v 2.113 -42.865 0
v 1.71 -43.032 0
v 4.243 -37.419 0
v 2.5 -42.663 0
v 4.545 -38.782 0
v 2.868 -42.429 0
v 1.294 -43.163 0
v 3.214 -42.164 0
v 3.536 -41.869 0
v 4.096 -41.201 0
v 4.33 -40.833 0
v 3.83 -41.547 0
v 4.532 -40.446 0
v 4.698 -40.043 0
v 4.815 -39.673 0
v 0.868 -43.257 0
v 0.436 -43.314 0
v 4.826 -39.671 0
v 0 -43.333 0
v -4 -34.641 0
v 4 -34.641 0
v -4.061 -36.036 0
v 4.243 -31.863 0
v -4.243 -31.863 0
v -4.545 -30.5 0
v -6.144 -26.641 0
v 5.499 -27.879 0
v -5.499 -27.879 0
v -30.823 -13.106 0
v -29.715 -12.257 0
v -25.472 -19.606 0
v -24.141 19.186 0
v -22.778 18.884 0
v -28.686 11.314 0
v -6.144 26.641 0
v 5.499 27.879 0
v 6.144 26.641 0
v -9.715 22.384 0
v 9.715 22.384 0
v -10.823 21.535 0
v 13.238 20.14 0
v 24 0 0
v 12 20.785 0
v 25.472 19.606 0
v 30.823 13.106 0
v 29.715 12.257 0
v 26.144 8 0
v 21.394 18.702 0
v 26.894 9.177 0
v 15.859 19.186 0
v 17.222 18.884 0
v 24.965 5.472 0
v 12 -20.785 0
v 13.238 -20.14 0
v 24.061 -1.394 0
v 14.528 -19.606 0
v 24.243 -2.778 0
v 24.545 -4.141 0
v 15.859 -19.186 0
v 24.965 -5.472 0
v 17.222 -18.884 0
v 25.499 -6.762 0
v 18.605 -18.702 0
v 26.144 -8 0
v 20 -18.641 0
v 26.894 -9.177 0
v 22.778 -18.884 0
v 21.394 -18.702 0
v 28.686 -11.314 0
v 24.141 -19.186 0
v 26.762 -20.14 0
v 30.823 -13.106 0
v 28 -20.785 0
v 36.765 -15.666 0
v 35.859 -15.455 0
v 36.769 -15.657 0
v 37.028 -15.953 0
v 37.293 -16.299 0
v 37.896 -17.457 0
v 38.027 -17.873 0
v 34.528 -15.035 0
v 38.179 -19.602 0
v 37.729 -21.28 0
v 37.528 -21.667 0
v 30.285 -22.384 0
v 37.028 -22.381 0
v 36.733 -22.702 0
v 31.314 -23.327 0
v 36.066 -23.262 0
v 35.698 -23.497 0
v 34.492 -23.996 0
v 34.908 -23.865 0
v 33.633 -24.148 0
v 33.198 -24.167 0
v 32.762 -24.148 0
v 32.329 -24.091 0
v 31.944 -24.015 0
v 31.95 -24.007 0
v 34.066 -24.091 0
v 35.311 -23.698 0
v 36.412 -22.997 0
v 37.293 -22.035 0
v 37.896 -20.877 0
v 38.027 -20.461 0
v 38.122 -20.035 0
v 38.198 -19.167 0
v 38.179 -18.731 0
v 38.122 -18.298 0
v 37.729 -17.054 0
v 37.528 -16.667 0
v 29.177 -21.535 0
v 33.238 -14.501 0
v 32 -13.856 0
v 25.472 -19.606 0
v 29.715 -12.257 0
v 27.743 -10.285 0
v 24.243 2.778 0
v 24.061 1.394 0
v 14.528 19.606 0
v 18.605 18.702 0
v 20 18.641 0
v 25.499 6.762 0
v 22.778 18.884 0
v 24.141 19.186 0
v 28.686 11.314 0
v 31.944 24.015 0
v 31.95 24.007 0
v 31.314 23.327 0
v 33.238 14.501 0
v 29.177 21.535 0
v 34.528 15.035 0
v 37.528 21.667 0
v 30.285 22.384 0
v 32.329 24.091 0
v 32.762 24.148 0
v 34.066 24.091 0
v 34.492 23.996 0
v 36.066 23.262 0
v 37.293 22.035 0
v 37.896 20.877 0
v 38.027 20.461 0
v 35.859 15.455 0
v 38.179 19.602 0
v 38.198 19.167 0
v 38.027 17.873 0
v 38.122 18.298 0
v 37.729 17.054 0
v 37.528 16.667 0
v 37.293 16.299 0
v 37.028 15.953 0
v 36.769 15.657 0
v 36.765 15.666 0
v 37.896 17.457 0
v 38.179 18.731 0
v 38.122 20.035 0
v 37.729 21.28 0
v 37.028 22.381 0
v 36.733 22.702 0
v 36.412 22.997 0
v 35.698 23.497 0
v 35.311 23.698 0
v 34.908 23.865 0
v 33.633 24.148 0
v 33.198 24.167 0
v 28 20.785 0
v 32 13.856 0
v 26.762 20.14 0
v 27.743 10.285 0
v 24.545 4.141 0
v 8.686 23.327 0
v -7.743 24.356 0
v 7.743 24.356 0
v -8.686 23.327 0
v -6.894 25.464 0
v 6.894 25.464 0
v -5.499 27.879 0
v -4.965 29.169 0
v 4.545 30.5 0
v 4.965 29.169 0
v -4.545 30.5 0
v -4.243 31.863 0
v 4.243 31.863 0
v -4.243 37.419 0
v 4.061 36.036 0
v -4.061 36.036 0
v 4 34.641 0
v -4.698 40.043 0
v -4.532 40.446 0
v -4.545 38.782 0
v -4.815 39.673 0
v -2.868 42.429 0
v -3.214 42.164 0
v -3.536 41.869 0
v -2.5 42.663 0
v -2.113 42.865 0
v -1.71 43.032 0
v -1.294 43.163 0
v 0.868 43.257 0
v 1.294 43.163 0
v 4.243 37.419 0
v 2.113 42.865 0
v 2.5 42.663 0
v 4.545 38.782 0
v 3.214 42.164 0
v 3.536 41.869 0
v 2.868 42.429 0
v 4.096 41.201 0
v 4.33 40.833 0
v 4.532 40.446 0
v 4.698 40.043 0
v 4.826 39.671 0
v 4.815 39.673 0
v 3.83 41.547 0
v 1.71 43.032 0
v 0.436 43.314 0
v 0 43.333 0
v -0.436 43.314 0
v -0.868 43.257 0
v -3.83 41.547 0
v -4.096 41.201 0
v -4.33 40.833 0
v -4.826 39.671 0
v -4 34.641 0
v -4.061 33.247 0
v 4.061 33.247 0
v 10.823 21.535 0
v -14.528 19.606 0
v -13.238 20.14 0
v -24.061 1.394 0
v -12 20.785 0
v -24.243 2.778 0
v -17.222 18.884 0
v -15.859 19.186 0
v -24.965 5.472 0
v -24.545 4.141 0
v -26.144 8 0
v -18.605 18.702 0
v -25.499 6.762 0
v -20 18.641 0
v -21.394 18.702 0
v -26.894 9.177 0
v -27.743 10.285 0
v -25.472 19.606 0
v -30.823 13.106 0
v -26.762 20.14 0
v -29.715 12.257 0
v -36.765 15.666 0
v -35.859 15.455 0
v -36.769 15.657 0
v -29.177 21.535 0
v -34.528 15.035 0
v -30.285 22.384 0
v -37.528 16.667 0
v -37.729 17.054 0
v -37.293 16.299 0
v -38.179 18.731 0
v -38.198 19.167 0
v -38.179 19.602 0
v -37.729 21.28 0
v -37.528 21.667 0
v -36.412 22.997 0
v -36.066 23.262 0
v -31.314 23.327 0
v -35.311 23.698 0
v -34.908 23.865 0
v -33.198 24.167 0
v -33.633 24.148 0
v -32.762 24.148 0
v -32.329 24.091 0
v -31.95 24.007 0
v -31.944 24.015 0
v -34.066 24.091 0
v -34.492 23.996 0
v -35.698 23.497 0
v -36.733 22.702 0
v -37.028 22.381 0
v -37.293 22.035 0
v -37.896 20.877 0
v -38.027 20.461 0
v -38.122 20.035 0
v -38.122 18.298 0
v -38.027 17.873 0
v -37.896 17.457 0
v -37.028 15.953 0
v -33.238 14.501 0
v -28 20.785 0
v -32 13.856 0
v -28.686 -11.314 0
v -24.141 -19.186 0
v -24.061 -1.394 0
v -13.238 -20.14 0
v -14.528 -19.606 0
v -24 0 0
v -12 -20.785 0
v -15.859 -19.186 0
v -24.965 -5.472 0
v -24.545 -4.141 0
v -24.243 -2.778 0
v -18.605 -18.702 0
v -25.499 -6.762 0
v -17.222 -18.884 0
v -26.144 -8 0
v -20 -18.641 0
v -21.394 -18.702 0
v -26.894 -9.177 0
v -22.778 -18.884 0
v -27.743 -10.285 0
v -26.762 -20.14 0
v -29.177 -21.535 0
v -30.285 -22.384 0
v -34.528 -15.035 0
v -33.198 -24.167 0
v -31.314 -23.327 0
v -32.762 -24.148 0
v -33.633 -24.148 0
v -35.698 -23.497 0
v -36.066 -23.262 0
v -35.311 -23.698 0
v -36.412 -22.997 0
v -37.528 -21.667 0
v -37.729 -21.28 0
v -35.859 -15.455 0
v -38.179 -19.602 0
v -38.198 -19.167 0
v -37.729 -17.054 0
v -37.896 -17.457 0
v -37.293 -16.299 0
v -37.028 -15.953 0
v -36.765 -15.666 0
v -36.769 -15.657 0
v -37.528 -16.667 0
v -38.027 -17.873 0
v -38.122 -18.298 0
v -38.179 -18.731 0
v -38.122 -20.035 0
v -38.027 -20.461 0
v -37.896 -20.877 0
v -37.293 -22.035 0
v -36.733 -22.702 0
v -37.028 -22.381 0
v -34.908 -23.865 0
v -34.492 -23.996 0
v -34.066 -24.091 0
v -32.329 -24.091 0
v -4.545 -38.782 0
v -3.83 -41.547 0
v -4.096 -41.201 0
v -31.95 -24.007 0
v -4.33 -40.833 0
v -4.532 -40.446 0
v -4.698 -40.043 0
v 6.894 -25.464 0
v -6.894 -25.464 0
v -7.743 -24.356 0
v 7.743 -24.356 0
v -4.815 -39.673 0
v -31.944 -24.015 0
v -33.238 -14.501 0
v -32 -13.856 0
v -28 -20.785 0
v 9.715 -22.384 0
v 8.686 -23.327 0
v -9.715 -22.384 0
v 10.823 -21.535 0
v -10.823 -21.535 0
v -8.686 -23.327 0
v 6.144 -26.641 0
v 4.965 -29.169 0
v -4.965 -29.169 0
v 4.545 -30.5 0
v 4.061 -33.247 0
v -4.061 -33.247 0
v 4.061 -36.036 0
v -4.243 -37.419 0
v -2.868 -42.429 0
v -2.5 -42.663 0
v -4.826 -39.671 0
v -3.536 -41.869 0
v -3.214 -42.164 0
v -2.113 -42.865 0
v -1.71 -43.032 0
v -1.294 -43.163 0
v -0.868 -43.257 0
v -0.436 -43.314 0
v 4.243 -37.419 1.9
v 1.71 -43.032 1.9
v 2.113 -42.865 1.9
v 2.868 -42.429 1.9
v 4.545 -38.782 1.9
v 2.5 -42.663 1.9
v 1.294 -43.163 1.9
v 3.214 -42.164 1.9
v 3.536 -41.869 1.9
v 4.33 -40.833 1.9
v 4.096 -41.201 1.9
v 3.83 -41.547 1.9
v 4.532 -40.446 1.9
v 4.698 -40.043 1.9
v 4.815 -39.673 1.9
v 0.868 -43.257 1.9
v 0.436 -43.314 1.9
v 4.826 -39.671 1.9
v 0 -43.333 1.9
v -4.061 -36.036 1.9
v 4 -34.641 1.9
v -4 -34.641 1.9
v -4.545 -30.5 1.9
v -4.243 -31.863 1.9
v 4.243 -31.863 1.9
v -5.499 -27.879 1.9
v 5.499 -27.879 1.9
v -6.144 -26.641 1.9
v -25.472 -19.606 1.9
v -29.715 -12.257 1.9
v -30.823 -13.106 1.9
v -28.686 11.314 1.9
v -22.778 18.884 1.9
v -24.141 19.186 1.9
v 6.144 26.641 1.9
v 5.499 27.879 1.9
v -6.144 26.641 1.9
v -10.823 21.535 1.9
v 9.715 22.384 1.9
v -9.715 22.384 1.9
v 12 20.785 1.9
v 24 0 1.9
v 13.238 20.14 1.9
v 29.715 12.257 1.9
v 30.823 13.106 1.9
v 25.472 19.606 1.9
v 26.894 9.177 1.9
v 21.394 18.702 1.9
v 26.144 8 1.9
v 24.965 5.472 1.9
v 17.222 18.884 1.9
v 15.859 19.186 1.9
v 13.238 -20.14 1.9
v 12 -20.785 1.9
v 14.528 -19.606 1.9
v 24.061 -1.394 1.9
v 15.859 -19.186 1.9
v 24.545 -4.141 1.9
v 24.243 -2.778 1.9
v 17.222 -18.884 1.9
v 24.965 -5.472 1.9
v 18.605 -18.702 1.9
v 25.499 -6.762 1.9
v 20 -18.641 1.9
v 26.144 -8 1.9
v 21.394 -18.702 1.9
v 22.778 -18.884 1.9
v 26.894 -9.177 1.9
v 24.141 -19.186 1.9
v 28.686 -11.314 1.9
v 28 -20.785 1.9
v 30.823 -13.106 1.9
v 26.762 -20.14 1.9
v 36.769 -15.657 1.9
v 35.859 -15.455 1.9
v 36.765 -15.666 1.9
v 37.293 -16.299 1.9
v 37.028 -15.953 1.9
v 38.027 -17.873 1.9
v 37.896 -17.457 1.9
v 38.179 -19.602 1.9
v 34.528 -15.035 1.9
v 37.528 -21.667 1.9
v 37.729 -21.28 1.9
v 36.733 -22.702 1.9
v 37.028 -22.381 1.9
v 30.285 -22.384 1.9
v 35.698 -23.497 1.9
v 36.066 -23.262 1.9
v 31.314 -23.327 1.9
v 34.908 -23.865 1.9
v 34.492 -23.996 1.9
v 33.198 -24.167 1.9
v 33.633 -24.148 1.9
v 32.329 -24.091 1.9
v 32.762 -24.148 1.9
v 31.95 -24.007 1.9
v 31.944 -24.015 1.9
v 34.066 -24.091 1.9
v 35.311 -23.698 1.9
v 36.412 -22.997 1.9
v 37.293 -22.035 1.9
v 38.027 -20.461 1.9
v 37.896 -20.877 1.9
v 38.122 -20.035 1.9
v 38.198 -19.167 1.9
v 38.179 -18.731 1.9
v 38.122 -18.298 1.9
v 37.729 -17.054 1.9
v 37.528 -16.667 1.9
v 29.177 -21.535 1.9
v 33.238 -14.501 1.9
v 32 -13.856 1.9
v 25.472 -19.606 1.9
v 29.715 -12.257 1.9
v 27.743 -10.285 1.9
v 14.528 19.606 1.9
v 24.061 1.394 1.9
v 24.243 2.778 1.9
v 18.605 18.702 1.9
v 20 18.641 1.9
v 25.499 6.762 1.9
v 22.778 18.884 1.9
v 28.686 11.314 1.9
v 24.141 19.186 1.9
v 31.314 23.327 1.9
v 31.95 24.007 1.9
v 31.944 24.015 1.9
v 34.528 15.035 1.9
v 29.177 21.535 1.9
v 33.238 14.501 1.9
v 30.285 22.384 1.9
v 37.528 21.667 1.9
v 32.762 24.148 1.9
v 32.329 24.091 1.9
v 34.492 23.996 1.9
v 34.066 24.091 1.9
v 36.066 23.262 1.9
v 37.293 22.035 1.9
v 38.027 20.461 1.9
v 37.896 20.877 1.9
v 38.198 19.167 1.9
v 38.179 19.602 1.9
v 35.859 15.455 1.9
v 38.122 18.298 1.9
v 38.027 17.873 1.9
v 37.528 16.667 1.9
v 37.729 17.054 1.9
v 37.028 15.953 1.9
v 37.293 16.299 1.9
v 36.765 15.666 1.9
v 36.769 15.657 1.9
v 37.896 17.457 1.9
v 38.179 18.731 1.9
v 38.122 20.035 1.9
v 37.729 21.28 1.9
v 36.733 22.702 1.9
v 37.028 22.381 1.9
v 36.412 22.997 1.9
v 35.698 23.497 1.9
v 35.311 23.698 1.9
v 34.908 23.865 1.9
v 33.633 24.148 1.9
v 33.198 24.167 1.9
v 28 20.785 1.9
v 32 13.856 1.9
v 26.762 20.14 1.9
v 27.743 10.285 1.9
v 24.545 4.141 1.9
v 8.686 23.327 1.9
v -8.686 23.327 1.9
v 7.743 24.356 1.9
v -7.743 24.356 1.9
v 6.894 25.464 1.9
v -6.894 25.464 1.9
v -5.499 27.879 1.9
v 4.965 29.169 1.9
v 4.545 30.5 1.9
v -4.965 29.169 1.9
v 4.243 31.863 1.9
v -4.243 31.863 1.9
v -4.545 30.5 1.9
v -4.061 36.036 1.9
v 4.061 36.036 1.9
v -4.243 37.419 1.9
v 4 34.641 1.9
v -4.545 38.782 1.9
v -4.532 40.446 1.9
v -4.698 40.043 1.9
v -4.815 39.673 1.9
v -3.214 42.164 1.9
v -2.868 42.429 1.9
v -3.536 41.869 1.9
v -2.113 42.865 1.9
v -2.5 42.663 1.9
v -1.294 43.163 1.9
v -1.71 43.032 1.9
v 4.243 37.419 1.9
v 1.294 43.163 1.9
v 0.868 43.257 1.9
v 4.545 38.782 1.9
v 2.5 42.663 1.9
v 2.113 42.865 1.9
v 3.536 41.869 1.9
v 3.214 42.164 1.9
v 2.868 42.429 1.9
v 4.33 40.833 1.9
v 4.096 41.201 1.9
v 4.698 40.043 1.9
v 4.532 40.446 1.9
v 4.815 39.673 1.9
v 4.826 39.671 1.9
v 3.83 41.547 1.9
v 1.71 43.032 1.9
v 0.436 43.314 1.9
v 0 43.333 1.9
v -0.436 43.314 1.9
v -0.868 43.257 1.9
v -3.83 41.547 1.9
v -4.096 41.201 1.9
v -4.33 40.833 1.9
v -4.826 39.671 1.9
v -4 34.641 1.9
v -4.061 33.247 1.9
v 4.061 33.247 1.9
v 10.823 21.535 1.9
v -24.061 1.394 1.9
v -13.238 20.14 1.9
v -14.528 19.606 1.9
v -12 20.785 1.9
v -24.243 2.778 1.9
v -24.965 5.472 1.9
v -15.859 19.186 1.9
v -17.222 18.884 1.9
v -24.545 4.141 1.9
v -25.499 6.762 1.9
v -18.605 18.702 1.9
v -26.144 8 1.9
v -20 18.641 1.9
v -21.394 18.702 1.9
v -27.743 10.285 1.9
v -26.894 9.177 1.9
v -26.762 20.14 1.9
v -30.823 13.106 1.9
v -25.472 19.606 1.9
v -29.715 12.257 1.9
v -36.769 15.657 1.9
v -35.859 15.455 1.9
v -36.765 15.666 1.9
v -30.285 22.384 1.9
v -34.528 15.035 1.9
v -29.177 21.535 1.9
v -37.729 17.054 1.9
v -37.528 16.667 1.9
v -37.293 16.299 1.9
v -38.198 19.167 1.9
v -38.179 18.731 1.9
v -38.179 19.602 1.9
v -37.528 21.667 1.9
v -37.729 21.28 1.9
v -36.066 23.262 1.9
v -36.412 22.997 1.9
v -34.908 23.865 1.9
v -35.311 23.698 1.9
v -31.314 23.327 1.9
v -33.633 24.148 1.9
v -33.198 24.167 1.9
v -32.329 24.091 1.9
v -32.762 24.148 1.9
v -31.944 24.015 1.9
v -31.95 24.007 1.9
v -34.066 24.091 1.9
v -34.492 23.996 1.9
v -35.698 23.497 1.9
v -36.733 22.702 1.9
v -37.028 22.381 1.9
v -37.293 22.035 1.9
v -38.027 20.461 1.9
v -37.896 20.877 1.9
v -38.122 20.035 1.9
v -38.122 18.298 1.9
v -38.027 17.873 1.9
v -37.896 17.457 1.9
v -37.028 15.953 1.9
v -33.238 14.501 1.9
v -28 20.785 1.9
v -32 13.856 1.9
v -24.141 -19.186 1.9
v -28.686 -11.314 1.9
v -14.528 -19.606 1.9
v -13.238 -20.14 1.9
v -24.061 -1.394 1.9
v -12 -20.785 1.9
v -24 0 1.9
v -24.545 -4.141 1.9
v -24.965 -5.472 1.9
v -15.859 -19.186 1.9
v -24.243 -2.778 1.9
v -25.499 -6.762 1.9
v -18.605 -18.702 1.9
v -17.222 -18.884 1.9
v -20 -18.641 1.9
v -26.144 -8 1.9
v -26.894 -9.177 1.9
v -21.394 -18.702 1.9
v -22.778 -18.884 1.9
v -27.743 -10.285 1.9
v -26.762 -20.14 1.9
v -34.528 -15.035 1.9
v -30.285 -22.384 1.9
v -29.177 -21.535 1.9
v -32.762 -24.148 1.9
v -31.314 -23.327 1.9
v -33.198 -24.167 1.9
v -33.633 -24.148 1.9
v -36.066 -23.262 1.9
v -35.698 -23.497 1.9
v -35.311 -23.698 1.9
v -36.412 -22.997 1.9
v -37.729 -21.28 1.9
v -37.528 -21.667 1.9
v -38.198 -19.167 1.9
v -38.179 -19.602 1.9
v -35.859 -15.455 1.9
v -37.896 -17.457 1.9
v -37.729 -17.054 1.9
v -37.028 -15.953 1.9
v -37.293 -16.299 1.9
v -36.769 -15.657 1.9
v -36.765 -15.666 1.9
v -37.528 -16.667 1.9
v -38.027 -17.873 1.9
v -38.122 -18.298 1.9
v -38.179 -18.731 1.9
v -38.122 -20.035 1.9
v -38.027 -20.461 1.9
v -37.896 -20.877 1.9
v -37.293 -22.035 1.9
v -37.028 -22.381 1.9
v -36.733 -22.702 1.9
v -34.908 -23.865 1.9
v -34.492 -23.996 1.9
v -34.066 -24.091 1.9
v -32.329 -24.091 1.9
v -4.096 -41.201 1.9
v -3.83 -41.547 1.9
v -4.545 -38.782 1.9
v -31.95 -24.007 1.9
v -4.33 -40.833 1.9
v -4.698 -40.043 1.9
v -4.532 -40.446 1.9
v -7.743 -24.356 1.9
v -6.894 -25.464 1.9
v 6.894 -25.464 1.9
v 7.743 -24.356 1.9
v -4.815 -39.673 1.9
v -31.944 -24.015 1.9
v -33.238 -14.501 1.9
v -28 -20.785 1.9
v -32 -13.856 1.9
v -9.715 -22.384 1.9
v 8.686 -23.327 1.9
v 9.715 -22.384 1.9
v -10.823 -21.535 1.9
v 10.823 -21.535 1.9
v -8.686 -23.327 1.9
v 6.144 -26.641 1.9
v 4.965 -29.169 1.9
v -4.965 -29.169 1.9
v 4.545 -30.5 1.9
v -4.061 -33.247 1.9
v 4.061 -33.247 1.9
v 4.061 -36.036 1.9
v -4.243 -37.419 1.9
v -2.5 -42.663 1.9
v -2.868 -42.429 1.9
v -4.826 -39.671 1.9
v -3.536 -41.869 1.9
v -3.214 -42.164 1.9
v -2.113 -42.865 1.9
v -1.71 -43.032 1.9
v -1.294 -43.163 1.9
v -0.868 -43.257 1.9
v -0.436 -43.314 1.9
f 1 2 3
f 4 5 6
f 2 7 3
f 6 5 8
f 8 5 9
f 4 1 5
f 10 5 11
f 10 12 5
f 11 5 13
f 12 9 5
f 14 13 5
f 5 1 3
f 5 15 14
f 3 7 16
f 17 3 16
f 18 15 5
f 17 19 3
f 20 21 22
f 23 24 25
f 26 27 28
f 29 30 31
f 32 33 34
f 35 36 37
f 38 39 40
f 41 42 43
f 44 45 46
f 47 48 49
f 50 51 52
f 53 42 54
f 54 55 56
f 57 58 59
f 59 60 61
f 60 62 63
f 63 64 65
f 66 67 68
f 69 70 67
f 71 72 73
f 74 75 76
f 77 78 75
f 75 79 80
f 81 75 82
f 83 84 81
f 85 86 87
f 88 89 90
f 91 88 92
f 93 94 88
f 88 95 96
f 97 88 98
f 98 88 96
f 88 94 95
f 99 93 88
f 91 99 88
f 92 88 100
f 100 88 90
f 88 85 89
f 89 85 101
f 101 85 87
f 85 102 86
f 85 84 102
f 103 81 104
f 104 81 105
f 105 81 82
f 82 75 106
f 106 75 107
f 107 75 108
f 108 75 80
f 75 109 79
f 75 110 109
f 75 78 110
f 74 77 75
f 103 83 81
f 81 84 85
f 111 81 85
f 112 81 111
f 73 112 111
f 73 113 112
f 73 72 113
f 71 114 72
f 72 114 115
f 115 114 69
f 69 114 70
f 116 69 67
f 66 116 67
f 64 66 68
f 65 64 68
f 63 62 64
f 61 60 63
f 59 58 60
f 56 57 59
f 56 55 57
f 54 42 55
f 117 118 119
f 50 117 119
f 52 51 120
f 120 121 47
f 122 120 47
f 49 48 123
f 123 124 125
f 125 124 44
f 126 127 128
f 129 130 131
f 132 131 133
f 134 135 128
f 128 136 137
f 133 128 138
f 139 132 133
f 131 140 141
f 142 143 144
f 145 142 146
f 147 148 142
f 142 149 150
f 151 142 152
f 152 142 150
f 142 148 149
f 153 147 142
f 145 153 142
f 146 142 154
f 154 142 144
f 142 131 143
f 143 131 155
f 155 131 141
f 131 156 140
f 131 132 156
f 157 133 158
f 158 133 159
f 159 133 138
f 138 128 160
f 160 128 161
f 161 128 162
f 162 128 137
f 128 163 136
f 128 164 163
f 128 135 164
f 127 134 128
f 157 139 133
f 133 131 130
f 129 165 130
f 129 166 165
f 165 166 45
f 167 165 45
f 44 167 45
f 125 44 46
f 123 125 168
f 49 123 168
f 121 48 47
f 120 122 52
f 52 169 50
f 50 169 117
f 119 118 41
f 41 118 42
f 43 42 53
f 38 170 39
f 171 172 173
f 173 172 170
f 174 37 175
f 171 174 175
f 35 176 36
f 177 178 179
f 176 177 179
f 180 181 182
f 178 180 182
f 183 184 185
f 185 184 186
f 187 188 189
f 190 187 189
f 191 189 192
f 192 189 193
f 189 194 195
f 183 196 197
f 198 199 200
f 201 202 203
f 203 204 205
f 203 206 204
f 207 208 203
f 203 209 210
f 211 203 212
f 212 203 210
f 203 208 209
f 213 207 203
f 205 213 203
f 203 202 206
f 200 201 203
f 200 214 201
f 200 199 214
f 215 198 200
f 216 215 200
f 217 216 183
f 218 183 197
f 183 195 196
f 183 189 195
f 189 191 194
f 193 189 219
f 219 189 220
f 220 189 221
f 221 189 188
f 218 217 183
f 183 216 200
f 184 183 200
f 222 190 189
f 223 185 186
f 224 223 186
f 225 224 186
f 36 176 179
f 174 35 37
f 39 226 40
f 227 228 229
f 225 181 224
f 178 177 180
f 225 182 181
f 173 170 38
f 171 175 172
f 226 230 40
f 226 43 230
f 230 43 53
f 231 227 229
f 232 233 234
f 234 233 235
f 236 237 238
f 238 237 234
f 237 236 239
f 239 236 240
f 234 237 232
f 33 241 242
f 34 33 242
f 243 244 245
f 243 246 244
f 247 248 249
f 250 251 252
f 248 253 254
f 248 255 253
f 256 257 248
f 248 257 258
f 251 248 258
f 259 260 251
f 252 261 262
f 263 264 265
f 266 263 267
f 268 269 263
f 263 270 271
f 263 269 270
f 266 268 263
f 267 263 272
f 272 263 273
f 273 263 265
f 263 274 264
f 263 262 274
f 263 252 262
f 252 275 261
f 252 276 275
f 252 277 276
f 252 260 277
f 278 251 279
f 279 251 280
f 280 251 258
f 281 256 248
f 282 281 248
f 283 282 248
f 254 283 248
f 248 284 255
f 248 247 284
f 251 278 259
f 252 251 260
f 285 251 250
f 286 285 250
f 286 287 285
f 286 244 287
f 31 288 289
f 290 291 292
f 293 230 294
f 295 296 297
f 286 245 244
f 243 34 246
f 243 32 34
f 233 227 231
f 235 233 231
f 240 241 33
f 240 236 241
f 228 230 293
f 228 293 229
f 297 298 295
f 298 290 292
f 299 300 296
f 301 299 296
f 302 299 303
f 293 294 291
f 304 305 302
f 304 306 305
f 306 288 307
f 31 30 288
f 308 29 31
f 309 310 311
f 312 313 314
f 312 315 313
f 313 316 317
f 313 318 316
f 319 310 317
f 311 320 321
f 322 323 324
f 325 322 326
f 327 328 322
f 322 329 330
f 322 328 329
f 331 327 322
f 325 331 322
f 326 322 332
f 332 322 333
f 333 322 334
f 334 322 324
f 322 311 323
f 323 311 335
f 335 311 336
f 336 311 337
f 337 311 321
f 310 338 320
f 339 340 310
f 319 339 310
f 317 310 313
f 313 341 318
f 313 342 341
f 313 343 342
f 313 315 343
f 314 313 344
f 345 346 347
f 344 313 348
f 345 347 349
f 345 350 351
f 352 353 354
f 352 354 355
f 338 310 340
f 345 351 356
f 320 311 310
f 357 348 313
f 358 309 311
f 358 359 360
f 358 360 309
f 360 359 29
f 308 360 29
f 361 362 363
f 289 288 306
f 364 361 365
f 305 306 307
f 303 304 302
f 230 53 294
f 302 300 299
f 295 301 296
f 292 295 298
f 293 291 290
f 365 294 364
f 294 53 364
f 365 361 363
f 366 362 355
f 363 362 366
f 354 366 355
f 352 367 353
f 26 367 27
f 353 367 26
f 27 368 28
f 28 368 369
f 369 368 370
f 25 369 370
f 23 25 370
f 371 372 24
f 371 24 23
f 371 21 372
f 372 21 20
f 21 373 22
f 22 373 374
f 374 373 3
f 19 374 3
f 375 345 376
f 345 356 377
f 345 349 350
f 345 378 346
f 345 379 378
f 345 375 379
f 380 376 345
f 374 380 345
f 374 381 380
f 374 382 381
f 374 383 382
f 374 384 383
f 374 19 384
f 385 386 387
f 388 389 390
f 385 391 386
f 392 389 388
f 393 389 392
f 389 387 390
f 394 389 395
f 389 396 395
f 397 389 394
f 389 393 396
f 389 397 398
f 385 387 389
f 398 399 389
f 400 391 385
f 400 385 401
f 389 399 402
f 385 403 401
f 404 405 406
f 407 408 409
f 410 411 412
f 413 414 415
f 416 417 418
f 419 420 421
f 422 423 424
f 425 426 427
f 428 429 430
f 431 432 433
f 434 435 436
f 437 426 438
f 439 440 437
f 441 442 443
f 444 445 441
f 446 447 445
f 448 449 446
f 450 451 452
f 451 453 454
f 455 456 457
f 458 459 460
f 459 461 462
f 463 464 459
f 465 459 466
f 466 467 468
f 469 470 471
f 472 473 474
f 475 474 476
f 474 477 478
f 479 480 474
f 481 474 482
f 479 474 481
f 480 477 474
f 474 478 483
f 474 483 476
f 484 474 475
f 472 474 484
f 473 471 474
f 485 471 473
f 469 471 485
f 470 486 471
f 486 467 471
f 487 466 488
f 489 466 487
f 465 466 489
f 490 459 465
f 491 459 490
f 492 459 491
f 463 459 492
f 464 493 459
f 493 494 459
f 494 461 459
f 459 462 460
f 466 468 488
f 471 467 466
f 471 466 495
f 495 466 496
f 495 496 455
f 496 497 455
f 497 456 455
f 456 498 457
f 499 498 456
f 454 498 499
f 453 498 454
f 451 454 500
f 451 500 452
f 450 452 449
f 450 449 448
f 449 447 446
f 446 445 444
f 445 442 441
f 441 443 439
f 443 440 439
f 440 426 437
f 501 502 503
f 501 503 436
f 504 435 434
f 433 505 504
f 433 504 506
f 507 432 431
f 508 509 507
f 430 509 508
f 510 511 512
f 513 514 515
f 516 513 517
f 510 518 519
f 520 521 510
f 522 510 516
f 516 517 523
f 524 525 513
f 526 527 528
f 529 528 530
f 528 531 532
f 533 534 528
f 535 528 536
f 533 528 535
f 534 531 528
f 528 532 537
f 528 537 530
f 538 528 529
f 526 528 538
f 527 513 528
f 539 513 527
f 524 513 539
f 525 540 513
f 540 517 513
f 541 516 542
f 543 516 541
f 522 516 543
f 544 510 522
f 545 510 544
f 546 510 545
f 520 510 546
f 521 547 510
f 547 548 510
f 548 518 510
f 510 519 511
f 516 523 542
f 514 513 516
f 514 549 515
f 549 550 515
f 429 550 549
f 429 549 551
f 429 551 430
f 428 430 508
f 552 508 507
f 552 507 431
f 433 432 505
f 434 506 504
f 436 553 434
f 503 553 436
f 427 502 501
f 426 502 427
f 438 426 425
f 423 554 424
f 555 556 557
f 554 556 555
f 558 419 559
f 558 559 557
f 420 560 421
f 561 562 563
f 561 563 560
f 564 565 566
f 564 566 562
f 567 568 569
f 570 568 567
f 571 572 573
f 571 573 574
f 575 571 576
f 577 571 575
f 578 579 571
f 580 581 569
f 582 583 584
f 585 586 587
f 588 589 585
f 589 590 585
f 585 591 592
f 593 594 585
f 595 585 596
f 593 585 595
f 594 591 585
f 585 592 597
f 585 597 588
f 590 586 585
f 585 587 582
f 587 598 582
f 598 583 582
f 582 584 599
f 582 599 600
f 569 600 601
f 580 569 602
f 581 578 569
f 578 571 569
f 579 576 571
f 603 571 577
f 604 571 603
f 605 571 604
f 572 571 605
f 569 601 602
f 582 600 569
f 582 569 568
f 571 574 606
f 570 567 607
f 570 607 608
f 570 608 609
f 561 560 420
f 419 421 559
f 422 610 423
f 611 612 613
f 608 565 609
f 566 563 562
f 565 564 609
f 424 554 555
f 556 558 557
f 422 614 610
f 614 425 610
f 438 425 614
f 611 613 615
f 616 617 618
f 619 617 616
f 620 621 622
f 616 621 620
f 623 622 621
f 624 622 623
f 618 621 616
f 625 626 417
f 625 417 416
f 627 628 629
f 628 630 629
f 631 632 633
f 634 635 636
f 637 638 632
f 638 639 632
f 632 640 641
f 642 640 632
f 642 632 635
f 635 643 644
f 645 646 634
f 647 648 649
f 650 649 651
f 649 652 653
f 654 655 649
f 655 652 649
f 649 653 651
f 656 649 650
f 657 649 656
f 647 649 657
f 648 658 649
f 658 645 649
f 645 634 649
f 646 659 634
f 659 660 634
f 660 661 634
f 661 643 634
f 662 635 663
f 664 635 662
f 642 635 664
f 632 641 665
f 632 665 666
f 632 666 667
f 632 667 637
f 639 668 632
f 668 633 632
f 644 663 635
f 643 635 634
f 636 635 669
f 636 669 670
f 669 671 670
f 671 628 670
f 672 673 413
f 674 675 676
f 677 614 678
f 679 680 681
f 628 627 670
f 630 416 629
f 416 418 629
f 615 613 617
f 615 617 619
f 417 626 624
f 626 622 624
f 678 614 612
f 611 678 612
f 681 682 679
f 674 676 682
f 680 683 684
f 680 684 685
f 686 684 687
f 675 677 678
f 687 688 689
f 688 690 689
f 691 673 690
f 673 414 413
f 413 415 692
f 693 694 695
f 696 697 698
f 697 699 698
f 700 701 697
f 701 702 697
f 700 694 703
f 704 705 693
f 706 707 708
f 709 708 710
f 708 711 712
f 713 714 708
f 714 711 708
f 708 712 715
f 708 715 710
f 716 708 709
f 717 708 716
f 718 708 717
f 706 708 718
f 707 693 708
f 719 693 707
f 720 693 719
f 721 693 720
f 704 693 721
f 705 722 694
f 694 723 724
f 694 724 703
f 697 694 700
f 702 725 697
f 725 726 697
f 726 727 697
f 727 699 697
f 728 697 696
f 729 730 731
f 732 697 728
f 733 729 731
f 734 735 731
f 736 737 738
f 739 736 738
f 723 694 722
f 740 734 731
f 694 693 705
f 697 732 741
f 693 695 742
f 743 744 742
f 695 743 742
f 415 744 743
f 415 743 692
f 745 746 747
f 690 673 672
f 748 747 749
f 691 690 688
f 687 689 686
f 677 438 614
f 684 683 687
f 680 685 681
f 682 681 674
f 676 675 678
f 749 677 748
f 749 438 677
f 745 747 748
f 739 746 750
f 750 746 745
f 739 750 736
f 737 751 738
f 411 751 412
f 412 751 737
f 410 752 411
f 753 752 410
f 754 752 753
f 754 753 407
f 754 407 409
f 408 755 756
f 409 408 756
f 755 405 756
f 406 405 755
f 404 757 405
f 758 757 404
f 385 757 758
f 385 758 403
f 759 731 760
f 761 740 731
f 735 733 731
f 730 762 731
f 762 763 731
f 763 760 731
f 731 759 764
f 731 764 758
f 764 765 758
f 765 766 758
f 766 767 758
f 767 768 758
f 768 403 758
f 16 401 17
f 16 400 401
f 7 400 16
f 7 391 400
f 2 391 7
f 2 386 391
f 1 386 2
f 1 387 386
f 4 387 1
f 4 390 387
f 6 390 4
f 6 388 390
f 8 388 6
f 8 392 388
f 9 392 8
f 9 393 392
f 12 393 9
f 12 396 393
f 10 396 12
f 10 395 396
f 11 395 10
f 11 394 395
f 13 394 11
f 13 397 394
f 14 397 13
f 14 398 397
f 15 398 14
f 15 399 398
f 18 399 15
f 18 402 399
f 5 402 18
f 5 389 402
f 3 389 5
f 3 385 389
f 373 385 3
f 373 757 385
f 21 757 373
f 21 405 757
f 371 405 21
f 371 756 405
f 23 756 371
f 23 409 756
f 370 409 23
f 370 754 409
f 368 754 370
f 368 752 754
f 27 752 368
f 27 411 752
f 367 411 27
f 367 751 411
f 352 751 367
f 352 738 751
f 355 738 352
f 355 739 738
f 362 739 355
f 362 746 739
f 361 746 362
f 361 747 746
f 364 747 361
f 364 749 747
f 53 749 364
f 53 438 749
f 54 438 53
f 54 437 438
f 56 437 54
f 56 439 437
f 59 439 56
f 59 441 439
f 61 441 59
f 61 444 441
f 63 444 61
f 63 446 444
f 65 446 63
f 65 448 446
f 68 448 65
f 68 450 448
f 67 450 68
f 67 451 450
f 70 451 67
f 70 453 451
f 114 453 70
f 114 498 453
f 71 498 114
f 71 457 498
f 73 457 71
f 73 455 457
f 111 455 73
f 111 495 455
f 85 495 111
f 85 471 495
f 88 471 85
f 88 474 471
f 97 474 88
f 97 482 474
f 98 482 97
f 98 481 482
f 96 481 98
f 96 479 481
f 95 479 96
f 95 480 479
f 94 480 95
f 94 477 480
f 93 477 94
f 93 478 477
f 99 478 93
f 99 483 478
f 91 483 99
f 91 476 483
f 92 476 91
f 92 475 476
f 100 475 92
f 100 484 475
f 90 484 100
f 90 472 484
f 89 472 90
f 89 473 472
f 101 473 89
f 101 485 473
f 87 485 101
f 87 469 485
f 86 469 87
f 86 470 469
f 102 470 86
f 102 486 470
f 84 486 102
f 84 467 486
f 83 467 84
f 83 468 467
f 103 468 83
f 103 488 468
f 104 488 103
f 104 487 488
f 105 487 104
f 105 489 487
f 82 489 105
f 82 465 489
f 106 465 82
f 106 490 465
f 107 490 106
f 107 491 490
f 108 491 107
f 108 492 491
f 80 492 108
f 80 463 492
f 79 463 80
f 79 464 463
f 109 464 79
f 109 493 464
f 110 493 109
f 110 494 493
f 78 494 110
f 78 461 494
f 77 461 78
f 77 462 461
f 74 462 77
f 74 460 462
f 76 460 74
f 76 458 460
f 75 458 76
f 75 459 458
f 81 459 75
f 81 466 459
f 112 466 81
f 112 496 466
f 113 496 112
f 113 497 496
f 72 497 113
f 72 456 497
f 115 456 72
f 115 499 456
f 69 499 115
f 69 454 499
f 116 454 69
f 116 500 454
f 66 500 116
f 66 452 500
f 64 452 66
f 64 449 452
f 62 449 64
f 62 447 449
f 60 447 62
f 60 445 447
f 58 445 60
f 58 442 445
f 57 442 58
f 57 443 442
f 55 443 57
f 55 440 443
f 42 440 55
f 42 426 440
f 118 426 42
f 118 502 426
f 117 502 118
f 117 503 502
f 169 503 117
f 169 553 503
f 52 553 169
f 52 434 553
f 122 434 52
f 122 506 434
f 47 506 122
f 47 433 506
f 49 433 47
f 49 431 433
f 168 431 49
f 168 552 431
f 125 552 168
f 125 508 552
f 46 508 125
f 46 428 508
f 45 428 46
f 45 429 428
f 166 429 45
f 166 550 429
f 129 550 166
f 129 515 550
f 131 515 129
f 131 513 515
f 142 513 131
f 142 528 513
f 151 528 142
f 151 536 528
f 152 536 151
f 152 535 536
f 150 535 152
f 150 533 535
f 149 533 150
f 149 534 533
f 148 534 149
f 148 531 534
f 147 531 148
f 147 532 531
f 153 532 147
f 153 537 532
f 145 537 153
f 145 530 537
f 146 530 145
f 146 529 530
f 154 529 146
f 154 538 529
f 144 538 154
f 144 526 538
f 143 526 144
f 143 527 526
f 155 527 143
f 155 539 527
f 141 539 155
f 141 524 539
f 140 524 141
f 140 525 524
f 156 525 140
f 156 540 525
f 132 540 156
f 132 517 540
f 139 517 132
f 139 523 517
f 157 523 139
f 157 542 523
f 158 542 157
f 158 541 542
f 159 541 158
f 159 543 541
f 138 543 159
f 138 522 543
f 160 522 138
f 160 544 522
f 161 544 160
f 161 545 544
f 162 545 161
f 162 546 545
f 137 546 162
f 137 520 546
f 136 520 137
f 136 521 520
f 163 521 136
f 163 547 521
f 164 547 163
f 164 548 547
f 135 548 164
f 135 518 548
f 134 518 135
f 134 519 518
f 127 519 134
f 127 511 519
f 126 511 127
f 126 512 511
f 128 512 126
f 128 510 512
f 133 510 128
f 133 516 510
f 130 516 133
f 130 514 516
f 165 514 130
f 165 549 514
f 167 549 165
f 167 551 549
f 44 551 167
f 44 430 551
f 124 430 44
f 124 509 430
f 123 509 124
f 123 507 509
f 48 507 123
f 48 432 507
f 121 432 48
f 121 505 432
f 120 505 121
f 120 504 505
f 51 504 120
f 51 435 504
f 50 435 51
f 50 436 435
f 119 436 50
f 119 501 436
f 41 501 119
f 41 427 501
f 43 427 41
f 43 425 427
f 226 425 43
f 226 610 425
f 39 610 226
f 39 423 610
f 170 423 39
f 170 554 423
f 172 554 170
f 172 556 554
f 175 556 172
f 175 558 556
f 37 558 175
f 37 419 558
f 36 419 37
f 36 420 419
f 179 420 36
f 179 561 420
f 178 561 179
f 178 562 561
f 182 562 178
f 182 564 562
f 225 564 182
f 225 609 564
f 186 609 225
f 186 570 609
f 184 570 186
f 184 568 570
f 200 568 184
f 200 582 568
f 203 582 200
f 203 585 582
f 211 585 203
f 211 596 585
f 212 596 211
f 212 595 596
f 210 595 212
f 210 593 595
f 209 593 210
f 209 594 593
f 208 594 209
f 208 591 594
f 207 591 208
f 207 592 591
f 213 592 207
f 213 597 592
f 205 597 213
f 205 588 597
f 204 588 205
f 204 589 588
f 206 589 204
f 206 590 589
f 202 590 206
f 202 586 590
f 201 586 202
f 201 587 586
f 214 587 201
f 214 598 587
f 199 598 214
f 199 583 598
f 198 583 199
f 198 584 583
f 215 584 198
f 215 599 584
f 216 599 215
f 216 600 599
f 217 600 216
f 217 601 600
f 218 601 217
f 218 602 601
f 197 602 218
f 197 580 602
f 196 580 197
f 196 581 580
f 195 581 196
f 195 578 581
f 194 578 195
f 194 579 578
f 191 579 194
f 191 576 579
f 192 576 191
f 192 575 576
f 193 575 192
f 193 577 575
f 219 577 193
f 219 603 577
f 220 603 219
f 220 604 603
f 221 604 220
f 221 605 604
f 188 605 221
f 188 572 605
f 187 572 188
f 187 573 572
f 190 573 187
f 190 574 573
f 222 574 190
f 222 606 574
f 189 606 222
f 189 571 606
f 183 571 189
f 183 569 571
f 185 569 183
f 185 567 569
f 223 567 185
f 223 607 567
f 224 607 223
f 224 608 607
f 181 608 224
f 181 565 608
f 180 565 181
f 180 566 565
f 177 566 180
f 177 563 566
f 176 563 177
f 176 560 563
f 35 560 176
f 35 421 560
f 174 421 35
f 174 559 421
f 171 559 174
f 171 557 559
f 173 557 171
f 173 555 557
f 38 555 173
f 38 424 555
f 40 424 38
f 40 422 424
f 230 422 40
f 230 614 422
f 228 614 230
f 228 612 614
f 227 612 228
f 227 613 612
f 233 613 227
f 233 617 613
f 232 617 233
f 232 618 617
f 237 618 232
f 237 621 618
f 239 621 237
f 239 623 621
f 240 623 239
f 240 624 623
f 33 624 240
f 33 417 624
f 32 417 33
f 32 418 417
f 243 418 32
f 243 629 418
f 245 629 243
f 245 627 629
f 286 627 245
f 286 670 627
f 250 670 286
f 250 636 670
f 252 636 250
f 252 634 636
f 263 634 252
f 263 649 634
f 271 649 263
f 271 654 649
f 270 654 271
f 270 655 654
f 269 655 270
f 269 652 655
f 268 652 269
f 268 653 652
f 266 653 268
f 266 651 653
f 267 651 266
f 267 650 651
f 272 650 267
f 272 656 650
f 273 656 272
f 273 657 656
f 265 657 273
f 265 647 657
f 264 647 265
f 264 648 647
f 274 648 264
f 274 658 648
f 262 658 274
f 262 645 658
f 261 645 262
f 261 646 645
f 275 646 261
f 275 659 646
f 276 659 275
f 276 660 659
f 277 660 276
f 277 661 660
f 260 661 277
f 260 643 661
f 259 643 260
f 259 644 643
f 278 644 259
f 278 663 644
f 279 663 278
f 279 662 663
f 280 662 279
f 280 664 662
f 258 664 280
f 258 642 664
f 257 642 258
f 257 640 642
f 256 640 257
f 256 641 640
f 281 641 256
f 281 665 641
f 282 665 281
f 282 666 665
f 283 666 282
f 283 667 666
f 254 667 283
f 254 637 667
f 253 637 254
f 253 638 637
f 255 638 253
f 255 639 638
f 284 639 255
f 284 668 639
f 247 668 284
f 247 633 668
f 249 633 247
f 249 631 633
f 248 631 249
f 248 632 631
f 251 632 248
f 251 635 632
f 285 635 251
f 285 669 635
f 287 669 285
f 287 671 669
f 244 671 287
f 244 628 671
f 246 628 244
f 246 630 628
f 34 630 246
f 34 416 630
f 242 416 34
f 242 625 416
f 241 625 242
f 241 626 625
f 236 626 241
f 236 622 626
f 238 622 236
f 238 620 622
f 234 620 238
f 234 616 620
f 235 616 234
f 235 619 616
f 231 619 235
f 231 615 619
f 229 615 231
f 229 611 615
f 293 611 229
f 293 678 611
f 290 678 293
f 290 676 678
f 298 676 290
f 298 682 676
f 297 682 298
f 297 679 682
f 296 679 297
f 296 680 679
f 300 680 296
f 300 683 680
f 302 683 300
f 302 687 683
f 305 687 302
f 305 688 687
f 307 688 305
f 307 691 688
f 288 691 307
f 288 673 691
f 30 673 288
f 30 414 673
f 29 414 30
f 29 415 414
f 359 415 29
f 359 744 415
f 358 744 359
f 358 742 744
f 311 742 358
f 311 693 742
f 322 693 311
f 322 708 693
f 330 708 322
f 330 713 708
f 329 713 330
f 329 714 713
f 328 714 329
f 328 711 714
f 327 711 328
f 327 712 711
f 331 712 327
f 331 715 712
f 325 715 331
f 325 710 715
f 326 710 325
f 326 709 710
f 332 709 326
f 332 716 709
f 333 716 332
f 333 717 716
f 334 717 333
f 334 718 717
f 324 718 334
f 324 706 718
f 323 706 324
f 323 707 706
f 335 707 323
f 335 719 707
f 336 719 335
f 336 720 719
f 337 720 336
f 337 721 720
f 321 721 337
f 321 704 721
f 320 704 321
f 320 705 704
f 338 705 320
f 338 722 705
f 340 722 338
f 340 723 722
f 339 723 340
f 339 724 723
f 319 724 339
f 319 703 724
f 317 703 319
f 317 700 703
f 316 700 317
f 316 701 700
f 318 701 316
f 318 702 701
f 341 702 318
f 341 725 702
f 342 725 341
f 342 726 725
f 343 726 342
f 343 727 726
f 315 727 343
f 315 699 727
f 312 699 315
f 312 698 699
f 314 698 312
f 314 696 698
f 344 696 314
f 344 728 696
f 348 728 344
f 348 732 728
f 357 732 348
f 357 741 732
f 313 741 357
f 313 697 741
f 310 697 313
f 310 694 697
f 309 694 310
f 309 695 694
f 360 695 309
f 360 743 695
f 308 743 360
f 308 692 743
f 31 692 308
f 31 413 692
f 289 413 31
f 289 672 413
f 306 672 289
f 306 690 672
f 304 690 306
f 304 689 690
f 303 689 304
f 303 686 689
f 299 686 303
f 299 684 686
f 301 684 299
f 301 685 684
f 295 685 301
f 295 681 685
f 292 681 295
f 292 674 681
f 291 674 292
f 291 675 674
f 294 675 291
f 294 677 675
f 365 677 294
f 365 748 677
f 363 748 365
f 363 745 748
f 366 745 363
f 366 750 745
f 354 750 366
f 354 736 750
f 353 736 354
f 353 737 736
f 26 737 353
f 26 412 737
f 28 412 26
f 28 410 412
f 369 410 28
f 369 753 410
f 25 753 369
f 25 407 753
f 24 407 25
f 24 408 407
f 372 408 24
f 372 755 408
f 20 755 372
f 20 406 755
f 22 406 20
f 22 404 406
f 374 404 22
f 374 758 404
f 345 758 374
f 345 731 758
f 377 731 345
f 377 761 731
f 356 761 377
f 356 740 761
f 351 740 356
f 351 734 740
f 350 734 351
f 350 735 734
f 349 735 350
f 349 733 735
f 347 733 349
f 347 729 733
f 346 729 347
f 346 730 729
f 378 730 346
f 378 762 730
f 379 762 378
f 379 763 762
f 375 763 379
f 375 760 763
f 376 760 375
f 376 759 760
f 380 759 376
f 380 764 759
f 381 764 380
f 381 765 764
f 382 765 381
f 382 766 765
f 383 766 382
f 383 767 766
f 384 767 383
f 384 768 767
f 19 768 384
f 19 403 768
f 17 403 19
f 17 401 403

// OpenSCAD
// Smoothness of generated output
nozzle_diameter = 0.4;
$fs = nozzle_diameter / 2;
$fa = 5;

large_circle_r = 40;
small_circle_r = 16;
point_r = 5;
thickness = 1.9;

linear_extrude(thickness)
difference() {
    union() {
        circle(r = large_circle_r);
        round_points();
    }
    cutouts();
}

module cutouts() {
    union() {
        for (z = [0:60:300]) {
            rotate([0,0,z])
            translate([large_circle_r,0,0])
            circle(r=small_circle_r);
        }
    }
}

module round_points() {
    union() {
        for (z = [30:60:330]) {
            rotate([0,0,z])
            translate([large_circle_r - point_r / 3,0,0])
            circle(r=point_r);
        }
    }
    
}
